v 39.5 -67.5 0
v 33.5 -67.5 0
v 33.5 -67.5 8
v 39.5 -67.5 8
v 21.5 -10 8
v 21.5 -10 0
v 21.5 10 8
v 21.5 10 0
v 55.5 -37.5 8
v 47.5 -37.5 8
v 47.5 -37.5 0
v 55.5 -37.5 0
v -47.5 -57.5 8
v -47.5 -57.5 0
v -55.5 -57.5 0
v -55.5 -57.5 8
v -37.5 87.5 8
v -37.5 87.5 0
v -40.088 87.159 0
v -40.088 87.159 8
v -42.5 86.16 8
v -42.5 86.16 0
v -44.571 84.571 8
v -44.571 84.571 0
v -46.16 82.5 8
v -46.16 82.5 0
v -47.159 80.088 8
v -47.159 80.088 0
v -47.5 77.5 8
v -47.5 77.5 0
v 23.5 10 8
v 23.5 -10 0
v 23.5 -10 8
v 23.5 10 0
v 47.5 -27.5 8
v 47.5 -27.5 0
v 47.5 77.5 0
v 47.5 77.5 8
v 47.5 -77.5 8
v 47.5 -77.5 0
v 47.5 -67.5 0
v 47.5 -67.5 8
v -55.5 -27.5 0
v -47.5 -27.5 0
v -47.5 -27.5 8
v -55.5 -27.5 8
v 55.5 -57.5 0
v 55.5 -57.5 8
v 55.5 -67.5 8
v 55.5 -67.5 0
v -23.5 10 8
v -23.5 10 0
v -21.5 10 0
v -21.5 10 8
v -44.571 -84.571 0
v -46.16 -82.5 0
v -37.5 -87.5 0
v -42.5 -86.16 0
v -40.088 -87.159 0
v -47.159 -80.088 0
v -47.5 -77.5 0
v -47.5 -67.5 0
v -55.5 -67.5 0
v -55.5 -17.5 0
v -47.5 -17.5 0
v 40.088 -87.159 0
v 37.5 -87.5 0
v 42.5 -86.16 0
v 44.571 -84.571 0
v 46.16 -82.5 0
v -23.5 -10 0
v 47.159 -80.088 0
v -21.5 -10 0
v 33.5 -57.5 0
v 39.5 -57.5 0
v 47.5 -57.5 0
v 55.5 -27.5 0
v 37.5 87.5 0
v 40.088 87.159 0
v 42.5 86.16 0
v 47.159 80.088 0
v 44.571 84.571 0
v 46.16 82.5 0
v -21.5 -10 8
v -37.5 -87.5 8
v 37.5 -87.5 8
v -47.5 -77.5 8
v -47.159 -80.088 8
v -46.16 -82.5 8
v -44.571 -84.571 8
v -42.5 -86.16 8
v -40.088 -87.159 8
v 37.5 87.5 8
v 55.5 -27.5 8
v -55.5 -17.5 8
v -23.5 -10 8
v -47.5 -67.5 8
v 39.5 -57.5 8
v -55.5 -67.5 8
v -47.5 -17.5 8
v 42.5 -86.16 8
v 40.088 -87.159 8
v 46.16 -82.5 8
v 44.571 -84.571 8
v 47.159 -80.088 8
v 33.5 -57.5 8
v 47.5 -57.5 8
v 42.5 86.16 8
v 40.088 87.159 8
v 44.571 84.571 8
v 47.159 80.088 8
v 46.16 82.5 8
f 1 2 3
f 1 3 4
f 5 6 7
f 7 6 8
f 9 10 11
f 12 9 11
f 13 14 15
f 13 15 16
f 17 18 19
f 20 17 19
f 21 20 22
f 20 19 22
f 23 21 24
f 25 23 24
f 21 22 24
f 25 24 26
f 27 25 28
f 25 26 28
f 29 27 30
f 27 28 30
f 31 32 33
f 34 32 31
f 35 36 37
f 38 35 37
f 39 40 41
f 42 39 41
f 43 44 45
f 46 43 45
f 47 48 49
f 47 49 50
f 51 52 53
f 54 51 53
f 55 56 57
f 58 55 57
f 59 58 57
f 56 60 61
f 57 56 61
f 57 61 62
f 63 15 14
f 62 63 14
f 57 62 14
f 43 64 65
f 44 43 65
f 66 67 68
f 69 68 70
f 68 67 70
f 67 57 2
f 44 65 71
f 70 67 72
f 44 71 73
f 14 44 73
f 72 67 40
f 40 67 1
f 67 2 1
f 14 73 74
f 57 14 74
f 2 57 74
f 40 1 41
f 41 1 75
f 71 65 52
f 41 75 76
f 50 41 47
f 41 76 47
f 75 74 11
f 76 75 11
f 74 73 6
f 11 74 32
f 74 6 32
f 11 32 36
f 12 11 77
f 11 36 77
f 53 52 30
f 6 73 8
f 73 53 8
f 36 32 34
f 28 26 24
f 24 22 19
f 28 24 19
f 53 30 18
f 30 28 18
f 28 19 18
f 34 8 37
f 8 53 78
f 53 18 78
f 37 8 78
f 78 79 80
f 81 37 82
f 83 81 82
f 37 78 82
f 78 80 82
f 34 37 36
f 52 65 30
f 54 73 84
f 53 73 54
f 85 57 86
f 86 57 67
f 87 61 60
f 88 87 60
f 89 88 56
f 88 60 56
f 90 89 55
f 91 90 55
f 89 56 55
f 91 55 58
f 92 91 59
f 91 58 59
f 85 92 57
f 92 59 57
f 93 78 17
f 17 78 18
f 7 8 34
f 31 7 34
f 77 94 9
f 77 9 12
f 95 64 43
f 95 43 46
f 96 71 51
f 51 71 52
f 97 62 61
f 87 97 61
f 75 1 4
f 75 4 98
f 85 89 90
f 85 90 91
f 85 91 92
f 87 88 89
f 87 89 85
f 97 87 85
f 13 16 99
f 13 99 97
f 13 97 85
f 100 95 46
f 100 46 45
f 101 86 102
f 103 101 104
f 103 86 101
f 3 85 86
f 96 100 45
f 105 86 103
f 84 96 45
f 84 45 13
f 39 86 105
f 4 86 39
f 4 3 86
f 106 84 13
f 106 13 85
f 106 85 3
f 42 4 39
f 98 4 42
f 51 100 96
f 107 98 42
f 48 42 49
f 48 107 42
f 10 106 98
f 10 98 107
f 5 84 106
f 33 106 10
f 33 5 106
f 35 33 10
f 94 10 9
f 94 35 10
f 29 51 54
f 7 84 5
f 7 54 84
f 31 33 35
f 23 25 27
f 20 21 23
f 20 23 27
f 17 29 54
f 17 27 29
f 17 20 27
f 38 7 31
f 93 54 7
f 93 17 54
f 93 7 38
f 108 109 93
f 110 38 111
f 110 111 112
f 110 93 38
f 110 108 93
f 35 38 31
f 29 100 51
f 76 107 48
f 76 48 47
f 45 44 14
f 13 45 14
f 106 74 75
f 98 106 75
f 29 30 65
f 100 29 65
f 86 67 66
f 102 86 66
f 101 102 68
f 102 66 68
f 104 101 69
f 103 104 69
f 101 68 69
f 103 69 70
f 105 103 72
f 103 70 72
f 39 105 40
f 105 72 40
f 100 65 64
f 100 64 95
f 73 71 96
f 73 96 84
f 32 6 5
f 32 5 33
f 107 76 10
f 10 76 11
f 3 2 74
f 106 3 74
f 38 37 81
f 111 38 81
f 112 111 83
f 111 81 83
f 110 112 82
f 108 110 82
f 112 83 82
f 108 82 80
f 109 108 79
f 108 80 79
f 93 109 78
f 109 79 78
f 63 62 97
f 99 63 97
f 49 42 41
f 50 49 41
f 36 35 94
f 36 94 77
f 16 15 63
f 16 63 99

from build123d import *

# Parameters (mm, degrees)
SKETCH1_W           = 2
SKETCH1_H           = 20
SKETCH1_W_2         = 6
SKETCH1_H_2         = 10
BOSS_EXTRUDE1_DEPTH = 8
SKETCH3_W           = 8
SKETCH3_H           = 10
BOSS_EXTRUDE2_DEPTH = 8
SKETCH4_W           = 8
SKETCH4_H           = 10
BOSS_EXTRUDE3_DEPTH = 8


with BuildPart() as part:
    # Sketch1 → Boss-Extrude1 (new body)
    with BuildSketch(Plane.XY):
        with BuildLine():
            Line((-37.5, -87.5), (37.5, -87.5))
            ThreePointArc((37.5, -87.5), (44.571067812, -84.571067812), (47.5, -77.5))
            Line((47.5, -77.5), (47.5, 77.5))
            ThreePointArc((47.5, 77.5), (44.571067812, 84.571067812), (37.5, 87.5))
            Line((37.5, 87.5), (-37.5, 87.5))
            ThreePointArc((-37.5, 87.5), (-44.571067812, 84.571067812), (-47.5, 77.5))
            Line((-47.5, 77.5), (-47.5, -77.5))
            ThreePointArc((-47.5, -77.5), (-44.571067812, -84.571067812), (-37.5, -87.5))
        make_face()
        with Locations((-22.5, 0)):
            Rectangle(SKETCH1_W, SKETCH1_H, mode=Mode.SUBTRACT)
        with Locations((22.5, 0)):
            Rectangle(SKETCH1_W, SKETCH1_H, mode=Mode.SUBTRACT)
        with Locations((36.5, -62.5)):
            Rectangle(SKETCH1_W_2, SKETCH1_H_2, mode=Mode.SUBTRACT)
    extrude(amount=BOSS_EXTRUDE1_DEPTH)

    # Sketch3 → Boss-Extrude2 (add)
    with BuildSketch(Plane.ZY.offset(47.5)):
        with Locations((4, -62.5)):
            Rectangle(SKETCH3_W, SKETCH3_H)
        with Locations((4, -22.5)):
            Rectangle(SKETCH3_W, SKETCH3_H)
    extrude(amount=BOSS_EXTRUDE2_DEPTH)

    # Sketch4 → Boss-Extrude3 (add)
    with BuildSketch(Plane(origin=(47.5, 0, 0), x_dir=(0, 0, -1), z_dir=(1, 0, 0))):
        with Locations((-4, -62.5)):
            Rectangle(SKETCH4_W, SKETCH4_H)
        with Locations((-4, -32.5)):
            Rectangle(SKETCH4_W, SKETCH4_H)
    extrude(amount=BOSS_EXTRUDE3_DEPTH)


solid = part.part
